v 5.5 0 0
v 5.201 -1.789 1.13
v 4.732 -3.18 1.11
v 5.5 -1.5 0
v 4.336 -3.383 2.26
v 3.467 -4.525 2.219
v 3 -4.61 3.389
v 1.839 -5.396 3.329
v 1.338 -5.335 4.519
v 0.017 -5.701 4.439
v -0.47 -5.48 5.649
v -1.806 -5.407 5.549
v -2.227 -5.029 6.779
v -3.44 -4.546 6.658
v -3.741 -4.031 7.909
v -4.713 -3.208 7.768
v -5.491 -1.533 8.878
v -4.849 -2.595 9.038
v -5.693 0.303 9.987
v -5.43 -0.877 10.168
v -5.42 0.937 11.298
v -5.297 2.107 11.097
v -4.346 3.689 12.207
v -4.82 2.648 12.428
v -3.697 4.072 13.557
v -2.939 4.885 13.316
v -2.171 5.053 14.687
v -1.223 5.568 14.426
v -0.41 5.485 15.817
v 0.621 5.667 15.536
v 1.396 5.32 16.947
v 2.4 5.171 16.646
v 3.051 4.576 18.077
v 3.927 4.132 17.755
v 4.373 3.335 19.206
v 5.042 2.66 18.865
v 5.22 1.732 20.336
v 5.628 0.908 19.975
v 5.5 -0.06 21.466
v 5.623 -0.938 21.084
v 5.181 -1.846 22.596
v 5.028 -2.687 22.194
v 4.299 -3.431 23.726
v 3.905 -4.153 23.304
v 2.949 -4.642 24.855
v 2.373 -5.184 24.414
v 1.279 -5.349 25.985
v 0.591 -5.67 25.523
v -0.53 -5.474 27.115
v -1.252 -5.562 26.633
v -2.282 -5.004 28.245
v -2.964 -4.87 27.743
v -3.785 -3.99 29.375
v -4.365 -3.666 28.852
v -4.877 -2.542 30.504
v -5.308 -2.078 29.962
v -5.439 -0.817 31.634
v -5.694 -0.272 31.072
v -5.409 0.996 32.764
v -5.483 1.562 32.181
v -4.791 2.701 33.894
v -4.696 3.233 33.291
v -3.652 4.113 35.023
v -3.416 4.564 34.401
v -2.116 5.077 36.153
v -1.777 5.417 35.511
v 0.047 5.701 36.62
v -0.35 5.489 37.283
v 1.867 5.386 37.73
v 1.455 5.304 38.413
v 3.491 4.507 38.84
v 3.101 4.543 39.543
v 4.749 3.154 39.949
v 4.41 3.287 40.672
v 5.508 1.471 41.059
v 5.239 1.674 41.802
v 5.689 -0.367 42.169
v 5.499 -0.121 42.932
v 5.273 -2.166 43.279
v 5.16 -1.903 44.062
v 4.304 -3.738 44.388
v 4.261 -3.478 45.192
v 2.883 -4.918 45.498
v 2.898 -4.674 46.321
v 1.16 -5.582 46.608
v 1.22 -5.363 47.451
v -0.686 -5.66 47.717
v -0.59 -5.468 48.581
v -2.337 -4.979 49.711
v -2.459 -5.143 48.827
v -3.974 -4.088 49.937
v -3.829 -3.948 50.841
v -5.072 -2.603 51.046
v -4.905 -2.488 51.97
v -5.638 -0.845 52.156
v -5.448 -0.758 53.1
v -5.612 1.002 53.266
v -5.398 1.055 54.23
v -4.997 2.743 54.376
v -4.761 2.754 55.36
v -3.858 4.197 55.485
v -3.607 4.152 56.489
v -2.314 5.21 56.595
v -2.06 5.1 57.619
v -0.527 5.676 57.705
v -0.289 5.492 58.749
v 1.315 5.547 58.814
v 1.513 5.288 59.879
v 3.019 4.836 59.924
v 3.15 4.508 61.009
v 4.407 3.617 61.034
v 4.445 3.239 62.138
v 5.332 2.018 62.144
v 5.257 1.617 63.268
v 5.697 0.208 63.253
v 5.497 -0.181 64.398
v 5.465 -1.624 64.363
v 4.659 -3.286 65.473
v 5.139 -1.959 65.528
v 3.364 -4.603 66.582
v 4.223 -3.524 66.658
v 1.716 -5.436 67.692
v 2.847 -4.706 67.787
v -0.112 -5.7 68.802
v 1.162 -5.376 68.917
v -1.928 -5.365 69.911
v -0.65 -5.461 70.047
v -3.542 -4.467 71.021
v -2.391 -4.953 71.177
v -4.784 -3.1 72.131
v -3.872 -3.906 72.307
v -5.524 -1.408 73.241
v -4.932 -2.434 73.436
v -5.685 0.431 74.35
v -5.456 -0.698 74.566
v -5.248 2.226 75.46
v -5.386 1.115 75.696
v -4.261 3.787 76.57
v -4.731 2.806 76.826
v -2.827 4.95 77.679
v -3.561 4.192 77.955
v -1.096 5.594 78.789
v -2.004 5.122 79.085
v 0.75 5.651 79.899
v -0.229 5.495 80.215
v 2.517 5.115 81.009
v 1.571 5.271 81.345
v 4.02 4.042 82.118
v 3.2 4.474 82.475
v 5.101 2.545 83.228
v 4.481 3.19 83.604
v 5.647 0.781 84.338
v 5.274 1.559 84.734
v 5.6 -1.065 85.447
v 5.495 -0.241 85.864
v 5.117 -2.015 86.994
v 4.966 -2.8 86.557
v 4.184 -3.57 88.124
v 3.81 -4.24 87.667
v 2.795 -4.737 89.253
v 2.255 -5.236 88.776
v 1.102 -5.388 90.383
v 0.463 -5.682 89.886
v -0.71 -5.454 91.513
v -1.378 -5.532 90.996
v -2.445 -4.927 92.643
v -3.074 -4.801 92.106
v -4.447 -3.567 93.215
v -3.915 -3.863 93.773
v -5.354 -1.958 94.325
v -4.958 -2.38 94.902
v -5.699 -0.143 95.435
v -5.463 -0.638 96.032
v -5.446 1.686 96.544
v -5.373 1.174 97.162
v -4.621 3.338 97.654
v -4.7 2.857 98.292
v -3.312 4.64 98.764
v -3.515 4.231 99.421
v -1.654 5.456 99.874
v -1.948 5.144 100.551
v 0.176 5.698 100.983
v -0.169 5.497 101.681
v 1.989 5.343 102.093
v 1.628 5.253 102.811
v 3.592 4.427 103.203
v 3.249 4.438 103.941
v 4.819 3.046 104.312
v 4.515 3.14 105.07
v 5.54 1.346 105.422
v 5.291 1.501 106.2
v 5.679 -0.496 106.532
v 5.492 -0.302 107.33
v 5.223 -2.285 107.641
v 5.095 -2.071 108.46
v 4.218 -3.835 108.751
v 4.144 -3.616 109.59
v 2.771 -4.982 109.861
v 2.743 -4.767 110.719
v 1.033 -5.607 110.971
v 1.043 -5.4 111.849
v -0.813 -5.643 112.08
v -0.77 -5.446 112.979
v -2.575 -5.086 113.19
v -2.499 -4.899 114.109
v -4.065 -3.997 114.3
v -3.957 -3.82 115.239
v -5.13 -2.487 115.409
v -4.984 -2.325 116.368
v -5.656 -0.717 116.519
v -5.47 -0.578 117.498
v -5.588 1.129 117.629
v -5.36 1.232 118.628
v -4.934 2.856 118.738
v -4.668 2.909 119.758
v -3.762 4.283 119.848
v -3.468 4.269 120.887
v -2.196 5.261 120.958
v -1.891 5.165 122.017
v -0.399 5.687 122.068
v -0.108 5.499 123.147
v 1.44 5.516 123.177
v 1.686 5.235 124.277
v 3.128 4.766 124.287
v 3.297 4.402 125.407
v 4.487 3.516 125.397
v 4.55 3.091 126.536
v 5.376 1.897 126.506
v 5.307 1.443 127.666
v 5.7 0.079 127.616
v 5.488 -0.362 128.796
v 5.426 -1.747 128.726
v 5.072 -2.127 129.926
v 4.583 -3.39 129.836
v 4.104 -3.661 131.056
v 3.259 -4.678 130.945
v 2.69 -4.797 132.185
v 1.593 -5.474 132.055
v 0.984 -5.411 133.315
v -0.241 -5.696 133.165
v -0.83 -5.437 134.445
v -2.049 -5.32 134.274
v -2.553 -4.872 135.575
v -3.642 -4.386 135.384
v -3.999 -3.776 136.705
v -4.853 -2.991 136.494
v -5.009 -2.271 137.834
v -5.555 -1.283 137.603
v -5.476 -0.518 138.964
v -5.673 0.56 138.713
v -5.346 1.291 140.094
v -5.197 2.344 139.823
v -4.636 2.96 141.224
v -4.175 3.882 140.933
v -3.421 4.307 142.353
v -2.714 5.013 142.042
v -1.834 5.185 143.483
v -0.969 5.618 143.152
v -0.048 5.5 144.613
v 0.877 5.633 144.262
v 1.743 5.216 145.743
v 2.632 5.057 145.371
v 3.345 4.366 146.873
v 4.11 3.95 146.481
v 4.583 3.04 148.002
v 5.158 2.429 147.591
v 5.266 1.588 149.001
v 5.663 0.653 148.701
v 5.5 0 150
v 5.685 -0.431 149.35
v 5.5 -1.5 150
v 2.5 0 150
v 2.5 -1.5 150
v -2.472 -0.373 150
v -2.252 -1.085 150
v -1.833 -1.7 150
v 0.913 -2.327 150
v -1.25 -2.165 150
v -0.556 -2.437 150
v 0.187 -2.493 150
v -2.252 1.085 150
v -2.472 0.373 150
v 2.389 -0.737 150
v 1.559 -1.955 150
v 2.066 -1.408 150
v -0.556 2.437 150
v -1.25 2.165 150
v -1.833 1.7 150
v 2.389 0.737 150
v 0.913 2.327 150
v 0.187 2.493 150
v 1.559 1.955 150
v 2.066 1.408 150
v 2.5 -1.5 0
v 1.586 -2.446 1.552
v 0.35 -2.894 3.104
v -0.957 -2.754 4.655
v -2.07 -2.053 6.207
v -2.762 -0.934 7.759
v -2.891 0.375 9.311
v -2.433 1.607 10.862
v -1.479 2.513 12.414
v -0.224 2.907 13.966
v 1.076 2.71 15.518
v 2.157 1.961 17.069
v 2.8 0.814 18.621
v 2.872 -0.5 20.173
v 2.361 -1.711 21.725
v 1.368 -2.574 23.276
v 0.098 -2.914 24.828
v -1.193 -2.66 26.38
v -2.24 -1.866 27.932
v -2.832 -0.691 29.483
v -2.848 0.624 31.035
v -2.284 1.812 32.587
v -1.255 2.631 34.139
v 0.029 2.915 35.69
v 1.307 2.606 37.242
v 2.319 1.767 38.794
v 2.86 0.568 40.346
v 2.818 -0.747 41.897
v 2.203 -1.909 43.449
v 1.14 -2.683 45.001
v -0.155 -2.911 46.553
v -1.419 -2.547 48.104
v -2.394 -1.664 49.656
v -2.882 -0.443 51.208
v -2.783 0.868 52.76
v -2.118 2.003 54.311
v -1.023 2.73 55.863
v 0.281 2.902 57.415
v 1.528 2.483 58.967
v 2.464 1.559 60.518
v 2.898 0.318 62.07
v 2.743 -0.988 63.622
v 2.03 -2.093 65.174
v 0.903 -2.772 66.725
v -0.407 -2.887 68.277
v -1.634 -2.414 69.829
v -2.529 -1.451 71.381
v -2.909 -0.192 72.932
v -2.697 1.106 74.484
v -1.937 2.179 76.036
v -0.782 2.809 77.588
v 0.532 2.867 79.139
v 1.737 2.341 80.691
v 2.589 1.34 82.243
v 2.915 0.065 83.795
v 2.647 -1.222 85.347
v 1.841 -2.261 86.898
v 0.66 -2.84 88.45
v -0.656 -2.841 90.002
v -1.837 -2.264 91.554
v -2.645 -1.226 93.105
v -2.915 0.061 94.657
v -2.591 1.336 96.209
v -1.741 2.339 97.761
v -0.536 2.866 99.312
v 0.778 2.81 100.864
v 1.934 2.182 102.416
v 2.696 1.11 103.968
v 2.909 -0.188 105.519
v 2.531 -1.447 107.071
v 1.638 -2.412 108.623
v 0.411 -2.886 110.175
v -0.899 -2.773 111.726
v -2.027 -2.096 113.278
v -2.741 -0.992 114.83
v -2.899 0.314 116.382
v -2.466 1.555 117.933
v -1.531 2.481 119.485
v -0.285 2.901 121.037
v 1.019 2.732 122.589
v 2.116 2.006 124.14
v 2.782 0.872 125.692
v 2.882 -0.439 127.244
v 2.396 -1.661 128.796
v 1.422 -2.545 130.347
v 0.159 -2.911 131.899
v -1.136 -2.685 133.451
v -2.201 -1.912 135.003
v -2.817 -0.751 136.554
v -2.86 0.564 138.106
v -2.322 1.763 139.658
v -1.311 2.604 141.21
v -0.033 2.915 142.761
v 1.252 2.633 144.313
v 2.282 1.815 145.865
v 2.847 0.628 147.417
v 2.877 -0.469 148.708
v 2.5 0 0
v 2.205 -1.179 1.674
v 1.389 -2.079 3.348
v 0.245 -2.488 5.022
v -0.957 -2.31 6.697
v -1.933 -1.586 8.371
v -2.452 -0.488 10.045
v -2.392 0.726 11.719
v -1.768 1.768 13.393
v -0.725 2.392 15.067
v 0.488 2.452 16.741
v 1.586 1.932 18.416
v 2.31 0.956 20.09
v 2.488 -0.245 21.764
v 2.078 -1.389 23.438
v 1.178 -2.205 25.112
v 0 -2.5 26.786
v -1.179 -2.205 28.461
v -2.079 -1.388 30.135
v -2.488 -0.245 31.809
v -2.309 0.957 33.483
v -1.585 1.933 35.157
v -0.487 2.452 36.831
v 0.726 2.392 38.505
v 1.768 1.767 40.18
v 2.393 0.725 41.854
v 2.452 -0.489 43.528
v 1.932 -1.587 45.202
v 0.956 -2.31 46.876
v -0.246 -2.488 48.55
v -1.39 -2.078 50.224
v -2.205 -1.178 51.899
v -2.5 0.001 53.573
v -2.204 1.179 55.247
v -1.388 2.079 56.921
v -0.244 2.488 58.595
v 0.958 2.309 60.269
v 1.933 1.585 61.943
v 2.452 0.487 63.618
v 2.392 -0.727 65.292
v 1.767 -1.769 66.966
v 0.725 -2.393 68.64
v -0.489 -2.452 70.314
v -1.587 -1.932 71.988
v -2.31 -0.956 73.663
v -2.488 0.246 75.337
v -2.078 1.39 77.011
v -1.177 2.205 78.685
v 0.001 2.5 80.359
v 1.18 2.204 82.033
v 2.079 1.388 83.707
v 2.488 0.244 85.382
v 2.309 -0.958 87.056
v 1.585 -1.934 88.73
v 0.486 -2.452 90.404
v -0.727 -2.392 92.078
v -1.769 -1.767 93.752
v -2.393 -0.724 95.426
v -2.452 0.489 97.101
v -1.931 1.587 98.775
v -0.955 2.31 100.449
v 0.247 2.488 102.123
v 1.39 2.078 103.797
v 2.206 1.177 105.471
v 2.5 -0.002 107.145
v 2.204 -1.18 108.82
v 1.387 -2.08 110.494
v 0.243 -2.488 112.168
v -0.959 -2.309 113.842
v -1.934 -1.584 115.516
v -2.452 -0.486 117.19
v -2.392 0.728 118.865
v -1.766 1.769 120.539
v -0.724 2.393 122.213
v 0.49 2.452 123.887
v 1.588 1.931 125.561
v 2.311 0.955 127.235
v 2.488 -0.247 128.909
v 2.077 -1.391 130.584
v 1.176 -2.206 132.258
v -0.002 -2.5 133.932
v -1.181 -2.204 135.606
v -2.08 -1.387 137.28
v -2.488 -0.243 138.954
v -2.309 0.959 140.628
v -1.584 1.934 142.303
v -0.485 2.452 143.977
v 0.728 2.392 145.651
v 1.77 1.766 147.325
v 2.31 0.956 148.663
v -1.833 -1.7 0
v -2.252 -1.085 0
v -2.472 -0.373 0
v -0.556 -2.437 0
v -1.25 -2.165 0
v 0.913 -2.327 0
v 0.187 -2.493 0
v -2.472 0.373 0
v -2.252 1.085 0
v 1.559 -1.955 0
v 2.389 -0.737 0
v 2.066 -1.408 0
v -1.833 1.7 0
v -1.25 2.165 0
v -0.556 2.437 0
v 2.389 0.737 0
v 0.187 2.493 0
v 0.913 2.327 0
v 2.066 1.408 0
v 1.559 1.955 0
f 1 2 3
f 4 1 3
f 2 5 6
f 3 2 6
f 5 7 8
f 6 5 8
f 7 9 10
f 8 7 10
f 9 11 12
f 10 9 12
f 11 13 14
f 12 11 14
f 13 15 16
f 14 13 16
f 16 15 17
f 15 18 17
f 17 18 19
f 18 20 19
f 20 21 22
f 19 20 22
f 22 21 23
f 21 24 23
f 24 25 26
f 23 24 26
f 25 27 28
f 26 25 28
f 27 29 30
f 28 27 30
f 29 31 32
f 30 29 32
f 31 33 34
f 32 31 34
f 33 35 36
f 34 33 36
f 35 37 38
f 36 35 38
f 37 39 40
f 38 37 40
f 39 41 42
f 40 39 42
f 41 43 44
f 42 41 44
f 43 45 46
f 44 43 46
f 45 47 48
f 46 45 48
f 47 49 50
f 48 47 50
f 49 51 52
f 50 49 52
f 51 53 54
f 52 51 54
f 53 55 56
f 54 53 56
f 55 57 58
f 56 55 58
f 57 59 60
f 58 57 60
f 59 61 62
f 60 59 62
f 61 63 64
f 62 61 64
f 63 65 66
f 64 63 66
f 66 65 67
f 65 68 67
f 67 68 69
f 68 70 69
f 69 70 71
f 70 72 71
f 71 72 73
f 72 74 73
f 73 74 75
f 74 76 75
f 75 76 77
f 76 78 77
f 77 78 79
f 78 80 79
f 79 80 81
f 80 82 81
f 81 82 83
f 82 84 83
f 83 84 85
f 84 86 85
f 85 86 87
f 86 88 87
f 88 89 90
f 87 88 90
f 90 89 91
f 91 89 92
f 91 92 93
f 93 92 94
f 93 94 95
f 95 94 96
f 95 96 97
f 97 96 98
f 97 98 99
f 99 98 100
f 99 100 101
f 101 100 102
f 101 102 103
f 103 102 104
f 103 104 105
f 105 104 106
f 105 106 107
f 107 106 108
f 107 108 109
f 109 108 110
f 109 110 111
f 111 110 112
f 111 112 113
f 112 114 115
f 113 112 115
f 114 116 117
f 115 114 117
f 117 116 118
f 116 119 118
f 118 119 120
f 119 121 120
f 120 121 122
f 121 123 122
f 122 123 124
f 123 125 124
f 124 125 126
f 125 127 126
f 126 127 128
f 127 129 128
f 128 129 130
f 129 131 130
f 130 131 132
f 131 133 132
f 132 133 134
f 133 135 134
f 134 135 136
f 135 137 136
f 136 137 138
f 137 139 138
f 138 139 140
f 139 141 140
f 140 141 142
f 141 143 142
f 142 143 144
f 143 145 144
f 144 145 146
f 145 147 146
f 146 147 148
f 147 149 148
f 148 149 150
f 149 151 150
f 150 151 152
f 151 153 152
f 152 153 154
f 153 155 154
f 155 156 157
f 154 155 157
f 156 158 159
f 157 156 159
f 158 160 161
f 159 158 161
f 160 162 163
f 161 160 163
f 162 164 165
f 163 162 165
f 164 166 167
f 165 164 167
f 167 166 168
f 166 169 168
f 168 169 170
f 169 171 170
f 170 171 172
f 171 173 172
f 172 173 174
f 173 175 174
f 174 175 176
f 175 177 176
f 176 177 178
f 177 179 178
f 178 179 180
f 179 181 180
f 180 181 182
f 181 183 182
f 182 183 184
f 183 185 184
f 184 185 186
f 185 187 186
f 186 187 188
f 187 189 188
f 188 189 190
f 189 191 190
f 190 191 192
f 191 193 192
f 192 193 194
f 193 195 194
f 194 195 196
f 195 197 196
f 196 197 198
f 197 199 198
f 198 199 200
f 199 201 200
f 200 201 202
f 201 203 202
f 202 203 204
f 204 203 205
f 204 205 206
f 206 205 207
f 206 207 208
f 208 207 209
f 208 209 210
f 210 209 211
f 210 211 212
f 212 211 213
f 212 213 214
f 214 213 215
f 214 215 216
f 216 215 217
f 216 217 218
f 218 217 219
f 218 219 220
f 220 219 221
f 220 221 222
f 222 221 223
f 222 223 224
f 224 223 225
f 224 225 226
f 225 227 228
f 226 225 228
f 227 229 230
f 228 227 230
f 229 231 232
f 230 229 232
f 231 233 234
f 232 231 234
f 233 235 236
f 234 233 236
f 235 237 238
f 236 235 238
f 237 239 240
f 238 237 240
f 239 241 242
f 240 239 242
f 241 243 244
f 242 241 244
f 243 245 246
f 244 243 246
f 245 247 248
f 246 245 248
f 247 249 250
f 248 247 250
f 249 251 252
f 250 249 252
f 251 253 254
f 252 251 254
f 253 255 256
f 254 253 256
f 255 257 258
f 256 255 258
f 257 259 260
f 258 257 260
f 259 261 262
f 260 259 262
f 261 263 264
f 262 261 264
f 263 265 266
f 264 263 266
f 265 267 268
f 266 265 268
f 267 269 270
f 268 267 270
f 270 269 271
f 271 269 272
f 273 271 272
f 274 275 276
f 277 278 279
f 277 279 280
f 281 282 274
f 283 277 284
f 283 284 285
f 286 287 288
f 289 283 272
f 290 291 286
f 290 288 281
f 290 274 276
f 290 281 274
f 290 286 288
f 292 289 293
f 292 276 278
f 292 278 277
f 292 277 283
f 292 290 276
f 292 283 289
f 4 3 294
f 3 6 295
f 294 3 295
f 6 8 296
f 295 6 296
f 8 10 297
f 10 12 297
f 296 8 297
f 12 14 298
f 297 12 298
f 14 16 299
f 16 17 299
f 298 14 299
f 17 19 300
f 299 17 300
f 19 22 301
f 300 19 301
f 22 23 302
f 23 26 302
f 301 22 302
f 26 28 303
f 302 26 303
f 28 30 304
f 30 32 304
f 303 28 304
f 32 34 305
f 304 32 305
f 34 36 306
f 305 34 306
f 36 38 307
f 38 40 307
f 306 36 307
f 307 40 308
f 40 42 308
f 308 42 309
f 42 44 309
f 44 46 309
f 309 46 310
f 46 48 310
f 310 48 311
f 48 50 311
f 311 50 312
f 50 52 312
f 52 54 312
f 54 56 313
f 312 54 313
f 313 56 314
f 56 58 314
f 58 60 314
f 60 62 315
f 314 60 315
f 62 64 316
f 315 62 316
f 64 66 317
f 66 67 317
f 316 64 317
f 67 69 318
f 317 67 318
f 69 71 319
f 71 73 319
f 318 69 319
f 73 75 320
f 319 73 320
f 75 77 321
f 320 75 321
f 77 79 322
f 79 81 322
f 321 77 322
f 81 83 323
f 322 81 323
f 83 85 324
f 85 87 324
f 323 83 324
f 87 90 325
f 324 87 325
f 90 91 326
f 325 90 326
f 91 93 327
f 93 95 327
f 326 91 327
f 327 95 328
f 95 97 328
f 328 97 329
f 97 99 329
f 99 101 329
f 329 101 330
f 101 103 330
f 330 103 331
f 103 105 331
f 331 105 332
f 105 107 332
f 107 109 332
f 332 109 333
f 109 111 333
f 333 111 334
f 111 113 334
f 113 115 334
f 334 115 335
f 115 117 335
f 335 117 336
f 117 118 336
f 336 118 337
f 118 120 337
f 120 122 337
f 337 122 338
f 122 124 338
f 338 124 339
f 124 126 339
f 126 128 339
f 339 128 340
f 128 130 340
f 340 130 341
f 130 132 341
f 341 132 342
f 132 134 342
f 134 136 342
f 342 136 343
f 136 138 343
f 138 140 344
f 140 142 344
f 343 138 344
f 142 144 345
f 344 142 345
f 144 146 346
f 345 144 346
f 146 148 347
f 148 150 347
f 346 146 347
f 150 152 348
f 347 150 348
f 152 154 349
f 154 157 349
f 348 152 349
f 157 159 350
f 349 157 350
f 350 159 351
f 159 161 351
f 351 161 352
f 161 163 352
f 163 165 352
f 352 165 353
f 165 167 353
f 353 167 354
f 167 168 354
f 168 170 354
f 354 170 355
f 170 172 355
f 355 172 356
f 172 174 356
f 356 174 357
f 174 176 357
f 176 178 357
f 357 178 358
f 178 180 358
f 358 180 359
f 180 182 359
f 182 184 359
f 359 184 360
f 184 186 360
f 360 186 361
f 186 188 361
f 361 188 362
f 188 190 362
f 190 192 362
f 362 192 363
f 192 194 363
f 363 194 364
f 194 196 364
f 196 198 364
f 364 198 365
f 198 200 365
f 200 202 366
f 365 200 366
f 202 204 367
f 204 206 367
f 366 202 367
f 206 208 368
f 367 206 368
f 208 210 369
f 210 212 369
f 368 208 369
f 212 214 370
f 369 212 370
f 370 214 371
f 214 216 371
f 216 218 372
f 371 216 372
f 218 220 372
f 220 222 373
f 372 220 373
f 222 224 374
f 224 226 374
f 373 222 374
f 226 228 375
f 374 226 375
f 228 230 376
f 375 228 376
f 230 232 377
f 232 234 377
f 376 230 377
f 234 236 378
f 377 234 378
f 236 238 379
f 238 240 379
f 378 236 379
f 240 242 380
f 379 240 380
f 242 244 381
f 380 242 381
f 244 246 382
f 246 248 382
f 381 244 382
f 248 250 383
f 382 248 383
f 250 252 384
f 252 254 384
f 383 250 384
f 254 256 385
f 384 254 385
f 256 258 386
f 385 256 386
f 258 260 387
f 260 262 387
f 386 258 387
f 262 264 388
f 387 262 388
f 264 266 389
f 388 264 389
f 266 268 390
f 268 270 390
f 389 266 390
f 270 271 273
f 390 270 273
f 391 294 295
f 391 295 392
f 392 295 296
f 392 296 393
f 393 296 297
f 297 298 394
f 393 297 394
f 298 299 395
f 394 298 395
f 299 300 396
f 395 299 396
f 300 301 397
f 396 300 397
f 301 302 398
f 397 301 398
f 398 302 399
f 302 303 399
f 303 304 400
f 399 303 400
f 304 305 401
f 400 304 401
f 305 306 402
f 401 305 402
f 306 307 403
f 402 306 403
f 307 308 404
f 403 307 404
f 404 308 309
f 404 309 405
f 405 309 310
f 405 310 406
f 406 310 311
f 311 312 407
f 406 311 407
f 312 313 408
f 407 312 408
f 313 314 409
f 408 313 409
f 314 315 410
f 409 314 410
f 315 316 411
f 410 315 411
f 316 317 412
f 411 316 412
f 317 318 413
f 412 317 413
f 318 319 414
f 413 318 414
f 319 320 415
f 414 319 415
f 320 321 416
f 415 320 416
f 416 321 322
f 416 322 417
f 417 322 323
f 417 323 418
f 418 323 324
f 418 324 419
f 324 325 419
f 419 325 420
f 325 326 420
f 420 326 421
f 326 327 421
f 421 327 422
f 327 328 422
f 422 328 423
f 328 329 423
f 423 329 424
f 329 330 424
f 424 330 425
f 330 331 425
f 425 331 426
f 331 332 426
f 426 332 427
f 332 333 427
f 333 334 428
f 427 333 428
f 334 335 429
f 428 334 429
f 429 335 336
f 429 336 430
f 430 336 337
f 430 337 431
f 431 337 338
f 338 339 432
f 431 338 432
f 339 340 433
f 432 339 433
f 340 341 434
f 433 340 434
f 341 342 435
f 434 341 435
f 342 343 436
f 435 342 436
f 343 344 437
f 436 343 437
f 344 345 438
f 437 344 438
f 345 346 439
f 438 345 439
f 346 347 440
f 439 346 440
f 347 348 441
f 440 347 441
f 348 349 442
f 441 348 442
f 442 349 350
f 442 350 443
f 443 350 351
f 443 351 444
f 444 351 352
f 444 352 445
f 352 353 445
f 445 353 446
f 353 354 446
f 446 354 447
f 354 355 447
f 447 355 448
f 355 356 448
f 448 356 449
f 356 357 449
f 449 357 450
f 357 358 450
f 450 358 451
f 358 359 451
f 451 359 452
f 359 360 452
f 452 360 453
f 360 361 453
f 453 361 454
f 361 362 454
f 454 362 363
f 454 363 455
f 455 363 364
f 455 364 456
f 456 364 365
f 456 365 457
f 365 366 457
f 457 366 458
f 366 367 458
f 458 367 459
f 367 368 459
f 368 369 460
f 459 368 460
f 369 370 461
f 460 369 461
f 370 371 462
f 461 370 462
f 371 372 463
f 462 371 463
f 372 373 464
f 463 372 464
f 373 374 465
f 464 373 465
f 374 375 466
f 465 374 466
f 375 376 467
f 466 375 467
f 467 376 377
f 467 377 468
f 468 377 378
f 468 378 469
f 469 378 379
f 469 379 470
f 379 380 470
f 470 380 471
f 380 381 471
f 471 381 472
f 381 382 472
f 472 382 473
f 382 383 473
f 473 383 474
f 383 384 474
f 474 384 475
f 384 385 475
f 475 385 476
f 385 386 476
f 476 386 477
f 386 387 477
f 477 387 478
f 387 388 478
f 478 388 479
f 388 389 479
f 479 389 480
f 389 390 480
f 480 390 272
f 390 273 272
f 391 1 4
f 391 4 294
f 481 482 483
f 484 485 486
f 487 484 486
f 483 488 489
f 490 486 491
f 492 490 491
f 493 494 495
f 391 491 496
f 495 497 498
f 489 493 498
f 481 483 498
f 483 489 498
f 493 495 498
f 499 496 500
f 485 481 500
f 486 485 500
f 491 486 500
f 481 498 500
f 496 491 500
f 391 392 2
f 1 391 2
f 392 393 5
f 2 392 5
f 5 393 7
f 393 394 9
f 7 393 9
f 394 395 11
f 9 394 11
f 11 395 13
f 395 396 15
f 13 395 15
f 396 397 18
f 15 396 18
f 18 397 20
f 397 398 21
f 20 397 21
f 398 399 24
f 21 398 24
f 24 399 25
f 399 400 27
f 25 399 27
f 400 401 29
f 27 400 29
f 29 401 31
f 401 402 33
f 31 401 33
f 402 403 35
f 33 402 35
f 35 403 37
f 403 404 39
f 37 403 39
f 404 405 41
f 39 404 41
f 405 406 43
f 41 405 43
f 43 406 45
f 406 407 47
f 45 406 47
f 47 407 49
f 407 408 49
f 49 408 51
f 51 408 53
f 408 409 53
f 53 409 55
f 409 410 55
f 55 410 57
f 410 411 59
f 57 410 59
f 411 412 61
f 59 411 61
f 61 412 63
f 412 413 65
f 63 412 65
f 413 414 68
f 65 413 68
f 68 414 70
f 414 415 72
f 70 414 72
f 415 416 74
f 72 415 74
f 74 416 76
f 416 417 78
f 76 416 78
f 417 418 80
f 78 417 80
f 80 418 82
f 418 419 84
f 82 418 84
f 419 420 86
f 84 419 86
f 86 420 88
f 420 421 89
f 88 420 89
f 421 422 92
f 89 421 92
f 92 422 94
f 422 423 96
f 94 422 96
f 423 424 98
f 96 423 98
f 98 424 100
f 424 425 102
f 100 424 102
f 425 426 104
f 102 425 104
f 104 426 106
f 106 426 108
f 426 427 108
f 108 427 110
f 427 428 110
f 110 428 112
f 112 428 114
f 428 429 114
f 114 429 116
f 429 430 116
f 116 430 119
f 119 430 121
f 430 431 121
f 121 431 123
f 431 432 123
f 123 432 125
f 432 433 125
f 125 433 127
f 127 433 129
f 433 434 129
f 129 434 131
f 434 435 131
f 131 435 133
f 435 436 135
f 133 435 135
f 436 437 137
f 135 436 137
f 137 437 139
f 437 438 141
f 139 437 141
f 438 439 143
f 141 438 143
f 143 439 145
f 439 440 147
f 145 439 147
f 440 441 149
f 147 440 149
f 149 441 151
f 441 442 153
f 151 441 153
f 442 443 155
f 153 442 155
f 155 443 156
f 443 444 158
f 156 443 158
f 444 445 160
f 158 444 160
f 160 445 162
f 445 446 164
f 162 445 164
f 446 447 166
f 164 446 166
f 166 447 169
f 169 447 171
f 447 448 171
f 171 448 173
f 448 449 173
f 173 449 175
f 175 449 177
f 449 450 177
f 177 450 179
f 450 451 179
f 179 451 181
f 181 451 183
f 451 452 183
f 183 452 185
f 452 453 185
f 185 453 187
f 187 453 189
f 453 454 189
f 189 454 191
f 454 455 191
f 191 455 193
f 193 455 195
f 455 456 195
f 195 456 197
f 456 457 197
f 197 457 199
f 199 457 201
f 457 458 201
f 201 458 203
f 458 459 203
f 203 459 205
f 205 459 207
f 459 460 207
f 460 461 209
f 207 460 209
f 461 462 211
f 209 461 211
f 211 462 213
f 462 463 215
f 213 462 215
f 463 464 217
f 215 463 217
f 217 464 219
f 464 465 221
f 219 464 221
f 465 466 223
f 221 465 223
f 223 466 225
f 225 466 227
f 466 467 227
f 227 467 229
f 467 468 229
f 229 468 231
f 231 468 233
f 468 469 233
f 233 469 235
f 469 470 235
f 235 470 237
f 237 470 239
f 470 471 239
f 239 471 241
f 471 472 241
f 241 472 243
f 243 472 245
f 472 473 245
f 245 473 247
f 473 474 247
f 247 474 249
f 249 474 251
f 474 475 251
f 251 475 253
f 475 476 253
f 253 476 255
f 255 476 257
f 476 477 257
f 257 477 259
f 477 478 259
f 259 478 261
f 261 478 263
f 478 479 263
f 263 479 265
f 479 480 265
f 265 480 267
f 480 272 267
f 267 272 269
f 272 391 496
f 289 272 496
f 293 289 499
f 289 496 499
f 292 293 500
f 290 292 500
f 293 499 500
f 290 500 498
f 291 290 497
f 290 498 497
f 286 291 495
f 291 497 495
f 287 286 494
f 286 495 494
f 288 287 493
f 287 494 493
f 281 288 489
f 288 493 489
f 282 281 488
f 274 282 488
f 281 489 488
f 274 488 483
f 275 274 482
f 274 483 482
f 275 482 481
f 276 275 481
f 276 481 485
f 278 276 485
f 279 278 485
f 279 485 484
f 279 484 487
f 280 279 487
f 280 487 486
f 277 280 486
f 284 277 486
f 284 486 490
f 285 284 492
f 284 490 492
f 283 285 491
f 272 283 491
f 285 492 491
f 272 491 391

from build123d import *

# Parameters (mm, degrees)
SKETCH1_R           = 2.5
BOSS_EXTRUDE1_DEPTH = 150
SWEEP5_PITCH        = 21.428571429
SWEEP5_HEIGHT       = 150
SWEEP5_RADIUS       = 2.5
SKETCH12_W          = 3
SKETCH12_H          = 1.5


with BuildPart() as part:
    # Sketch1 → Boss-Extrude1 (new body)
    with BuildSketch(Plane.XY):
        Circle(SKETCH1_R)
    extrude(amount=BOSS_EXTRUDE1_DEPTH)


with BuildPart() as body_2:
    # Sweep5: sweep along a helix
    with BuildLine() as sweep5_path:
        Helix(SWEEP5_PITCH, SWEEP5_HEIGHT, SWEEP5_RADIUS, center=(0, 0, 0), direction=(0, 0, 1), lefthand=True)
    # Sketch12 → Sweep5 (sweep)
    with BuildSketch(Plane(origin=(0, 0, 0), x_dir=(-1, 0, 0), z_dir=(0, 0, -1))):
        with Locations((-4, -0.75)):
            Rectangle(SKETCH12_W, SKETCH12_H)
    sweep(path=sweep5_path.line, is_frenet=True)


solid = Compound([part.part, body_2.part])
